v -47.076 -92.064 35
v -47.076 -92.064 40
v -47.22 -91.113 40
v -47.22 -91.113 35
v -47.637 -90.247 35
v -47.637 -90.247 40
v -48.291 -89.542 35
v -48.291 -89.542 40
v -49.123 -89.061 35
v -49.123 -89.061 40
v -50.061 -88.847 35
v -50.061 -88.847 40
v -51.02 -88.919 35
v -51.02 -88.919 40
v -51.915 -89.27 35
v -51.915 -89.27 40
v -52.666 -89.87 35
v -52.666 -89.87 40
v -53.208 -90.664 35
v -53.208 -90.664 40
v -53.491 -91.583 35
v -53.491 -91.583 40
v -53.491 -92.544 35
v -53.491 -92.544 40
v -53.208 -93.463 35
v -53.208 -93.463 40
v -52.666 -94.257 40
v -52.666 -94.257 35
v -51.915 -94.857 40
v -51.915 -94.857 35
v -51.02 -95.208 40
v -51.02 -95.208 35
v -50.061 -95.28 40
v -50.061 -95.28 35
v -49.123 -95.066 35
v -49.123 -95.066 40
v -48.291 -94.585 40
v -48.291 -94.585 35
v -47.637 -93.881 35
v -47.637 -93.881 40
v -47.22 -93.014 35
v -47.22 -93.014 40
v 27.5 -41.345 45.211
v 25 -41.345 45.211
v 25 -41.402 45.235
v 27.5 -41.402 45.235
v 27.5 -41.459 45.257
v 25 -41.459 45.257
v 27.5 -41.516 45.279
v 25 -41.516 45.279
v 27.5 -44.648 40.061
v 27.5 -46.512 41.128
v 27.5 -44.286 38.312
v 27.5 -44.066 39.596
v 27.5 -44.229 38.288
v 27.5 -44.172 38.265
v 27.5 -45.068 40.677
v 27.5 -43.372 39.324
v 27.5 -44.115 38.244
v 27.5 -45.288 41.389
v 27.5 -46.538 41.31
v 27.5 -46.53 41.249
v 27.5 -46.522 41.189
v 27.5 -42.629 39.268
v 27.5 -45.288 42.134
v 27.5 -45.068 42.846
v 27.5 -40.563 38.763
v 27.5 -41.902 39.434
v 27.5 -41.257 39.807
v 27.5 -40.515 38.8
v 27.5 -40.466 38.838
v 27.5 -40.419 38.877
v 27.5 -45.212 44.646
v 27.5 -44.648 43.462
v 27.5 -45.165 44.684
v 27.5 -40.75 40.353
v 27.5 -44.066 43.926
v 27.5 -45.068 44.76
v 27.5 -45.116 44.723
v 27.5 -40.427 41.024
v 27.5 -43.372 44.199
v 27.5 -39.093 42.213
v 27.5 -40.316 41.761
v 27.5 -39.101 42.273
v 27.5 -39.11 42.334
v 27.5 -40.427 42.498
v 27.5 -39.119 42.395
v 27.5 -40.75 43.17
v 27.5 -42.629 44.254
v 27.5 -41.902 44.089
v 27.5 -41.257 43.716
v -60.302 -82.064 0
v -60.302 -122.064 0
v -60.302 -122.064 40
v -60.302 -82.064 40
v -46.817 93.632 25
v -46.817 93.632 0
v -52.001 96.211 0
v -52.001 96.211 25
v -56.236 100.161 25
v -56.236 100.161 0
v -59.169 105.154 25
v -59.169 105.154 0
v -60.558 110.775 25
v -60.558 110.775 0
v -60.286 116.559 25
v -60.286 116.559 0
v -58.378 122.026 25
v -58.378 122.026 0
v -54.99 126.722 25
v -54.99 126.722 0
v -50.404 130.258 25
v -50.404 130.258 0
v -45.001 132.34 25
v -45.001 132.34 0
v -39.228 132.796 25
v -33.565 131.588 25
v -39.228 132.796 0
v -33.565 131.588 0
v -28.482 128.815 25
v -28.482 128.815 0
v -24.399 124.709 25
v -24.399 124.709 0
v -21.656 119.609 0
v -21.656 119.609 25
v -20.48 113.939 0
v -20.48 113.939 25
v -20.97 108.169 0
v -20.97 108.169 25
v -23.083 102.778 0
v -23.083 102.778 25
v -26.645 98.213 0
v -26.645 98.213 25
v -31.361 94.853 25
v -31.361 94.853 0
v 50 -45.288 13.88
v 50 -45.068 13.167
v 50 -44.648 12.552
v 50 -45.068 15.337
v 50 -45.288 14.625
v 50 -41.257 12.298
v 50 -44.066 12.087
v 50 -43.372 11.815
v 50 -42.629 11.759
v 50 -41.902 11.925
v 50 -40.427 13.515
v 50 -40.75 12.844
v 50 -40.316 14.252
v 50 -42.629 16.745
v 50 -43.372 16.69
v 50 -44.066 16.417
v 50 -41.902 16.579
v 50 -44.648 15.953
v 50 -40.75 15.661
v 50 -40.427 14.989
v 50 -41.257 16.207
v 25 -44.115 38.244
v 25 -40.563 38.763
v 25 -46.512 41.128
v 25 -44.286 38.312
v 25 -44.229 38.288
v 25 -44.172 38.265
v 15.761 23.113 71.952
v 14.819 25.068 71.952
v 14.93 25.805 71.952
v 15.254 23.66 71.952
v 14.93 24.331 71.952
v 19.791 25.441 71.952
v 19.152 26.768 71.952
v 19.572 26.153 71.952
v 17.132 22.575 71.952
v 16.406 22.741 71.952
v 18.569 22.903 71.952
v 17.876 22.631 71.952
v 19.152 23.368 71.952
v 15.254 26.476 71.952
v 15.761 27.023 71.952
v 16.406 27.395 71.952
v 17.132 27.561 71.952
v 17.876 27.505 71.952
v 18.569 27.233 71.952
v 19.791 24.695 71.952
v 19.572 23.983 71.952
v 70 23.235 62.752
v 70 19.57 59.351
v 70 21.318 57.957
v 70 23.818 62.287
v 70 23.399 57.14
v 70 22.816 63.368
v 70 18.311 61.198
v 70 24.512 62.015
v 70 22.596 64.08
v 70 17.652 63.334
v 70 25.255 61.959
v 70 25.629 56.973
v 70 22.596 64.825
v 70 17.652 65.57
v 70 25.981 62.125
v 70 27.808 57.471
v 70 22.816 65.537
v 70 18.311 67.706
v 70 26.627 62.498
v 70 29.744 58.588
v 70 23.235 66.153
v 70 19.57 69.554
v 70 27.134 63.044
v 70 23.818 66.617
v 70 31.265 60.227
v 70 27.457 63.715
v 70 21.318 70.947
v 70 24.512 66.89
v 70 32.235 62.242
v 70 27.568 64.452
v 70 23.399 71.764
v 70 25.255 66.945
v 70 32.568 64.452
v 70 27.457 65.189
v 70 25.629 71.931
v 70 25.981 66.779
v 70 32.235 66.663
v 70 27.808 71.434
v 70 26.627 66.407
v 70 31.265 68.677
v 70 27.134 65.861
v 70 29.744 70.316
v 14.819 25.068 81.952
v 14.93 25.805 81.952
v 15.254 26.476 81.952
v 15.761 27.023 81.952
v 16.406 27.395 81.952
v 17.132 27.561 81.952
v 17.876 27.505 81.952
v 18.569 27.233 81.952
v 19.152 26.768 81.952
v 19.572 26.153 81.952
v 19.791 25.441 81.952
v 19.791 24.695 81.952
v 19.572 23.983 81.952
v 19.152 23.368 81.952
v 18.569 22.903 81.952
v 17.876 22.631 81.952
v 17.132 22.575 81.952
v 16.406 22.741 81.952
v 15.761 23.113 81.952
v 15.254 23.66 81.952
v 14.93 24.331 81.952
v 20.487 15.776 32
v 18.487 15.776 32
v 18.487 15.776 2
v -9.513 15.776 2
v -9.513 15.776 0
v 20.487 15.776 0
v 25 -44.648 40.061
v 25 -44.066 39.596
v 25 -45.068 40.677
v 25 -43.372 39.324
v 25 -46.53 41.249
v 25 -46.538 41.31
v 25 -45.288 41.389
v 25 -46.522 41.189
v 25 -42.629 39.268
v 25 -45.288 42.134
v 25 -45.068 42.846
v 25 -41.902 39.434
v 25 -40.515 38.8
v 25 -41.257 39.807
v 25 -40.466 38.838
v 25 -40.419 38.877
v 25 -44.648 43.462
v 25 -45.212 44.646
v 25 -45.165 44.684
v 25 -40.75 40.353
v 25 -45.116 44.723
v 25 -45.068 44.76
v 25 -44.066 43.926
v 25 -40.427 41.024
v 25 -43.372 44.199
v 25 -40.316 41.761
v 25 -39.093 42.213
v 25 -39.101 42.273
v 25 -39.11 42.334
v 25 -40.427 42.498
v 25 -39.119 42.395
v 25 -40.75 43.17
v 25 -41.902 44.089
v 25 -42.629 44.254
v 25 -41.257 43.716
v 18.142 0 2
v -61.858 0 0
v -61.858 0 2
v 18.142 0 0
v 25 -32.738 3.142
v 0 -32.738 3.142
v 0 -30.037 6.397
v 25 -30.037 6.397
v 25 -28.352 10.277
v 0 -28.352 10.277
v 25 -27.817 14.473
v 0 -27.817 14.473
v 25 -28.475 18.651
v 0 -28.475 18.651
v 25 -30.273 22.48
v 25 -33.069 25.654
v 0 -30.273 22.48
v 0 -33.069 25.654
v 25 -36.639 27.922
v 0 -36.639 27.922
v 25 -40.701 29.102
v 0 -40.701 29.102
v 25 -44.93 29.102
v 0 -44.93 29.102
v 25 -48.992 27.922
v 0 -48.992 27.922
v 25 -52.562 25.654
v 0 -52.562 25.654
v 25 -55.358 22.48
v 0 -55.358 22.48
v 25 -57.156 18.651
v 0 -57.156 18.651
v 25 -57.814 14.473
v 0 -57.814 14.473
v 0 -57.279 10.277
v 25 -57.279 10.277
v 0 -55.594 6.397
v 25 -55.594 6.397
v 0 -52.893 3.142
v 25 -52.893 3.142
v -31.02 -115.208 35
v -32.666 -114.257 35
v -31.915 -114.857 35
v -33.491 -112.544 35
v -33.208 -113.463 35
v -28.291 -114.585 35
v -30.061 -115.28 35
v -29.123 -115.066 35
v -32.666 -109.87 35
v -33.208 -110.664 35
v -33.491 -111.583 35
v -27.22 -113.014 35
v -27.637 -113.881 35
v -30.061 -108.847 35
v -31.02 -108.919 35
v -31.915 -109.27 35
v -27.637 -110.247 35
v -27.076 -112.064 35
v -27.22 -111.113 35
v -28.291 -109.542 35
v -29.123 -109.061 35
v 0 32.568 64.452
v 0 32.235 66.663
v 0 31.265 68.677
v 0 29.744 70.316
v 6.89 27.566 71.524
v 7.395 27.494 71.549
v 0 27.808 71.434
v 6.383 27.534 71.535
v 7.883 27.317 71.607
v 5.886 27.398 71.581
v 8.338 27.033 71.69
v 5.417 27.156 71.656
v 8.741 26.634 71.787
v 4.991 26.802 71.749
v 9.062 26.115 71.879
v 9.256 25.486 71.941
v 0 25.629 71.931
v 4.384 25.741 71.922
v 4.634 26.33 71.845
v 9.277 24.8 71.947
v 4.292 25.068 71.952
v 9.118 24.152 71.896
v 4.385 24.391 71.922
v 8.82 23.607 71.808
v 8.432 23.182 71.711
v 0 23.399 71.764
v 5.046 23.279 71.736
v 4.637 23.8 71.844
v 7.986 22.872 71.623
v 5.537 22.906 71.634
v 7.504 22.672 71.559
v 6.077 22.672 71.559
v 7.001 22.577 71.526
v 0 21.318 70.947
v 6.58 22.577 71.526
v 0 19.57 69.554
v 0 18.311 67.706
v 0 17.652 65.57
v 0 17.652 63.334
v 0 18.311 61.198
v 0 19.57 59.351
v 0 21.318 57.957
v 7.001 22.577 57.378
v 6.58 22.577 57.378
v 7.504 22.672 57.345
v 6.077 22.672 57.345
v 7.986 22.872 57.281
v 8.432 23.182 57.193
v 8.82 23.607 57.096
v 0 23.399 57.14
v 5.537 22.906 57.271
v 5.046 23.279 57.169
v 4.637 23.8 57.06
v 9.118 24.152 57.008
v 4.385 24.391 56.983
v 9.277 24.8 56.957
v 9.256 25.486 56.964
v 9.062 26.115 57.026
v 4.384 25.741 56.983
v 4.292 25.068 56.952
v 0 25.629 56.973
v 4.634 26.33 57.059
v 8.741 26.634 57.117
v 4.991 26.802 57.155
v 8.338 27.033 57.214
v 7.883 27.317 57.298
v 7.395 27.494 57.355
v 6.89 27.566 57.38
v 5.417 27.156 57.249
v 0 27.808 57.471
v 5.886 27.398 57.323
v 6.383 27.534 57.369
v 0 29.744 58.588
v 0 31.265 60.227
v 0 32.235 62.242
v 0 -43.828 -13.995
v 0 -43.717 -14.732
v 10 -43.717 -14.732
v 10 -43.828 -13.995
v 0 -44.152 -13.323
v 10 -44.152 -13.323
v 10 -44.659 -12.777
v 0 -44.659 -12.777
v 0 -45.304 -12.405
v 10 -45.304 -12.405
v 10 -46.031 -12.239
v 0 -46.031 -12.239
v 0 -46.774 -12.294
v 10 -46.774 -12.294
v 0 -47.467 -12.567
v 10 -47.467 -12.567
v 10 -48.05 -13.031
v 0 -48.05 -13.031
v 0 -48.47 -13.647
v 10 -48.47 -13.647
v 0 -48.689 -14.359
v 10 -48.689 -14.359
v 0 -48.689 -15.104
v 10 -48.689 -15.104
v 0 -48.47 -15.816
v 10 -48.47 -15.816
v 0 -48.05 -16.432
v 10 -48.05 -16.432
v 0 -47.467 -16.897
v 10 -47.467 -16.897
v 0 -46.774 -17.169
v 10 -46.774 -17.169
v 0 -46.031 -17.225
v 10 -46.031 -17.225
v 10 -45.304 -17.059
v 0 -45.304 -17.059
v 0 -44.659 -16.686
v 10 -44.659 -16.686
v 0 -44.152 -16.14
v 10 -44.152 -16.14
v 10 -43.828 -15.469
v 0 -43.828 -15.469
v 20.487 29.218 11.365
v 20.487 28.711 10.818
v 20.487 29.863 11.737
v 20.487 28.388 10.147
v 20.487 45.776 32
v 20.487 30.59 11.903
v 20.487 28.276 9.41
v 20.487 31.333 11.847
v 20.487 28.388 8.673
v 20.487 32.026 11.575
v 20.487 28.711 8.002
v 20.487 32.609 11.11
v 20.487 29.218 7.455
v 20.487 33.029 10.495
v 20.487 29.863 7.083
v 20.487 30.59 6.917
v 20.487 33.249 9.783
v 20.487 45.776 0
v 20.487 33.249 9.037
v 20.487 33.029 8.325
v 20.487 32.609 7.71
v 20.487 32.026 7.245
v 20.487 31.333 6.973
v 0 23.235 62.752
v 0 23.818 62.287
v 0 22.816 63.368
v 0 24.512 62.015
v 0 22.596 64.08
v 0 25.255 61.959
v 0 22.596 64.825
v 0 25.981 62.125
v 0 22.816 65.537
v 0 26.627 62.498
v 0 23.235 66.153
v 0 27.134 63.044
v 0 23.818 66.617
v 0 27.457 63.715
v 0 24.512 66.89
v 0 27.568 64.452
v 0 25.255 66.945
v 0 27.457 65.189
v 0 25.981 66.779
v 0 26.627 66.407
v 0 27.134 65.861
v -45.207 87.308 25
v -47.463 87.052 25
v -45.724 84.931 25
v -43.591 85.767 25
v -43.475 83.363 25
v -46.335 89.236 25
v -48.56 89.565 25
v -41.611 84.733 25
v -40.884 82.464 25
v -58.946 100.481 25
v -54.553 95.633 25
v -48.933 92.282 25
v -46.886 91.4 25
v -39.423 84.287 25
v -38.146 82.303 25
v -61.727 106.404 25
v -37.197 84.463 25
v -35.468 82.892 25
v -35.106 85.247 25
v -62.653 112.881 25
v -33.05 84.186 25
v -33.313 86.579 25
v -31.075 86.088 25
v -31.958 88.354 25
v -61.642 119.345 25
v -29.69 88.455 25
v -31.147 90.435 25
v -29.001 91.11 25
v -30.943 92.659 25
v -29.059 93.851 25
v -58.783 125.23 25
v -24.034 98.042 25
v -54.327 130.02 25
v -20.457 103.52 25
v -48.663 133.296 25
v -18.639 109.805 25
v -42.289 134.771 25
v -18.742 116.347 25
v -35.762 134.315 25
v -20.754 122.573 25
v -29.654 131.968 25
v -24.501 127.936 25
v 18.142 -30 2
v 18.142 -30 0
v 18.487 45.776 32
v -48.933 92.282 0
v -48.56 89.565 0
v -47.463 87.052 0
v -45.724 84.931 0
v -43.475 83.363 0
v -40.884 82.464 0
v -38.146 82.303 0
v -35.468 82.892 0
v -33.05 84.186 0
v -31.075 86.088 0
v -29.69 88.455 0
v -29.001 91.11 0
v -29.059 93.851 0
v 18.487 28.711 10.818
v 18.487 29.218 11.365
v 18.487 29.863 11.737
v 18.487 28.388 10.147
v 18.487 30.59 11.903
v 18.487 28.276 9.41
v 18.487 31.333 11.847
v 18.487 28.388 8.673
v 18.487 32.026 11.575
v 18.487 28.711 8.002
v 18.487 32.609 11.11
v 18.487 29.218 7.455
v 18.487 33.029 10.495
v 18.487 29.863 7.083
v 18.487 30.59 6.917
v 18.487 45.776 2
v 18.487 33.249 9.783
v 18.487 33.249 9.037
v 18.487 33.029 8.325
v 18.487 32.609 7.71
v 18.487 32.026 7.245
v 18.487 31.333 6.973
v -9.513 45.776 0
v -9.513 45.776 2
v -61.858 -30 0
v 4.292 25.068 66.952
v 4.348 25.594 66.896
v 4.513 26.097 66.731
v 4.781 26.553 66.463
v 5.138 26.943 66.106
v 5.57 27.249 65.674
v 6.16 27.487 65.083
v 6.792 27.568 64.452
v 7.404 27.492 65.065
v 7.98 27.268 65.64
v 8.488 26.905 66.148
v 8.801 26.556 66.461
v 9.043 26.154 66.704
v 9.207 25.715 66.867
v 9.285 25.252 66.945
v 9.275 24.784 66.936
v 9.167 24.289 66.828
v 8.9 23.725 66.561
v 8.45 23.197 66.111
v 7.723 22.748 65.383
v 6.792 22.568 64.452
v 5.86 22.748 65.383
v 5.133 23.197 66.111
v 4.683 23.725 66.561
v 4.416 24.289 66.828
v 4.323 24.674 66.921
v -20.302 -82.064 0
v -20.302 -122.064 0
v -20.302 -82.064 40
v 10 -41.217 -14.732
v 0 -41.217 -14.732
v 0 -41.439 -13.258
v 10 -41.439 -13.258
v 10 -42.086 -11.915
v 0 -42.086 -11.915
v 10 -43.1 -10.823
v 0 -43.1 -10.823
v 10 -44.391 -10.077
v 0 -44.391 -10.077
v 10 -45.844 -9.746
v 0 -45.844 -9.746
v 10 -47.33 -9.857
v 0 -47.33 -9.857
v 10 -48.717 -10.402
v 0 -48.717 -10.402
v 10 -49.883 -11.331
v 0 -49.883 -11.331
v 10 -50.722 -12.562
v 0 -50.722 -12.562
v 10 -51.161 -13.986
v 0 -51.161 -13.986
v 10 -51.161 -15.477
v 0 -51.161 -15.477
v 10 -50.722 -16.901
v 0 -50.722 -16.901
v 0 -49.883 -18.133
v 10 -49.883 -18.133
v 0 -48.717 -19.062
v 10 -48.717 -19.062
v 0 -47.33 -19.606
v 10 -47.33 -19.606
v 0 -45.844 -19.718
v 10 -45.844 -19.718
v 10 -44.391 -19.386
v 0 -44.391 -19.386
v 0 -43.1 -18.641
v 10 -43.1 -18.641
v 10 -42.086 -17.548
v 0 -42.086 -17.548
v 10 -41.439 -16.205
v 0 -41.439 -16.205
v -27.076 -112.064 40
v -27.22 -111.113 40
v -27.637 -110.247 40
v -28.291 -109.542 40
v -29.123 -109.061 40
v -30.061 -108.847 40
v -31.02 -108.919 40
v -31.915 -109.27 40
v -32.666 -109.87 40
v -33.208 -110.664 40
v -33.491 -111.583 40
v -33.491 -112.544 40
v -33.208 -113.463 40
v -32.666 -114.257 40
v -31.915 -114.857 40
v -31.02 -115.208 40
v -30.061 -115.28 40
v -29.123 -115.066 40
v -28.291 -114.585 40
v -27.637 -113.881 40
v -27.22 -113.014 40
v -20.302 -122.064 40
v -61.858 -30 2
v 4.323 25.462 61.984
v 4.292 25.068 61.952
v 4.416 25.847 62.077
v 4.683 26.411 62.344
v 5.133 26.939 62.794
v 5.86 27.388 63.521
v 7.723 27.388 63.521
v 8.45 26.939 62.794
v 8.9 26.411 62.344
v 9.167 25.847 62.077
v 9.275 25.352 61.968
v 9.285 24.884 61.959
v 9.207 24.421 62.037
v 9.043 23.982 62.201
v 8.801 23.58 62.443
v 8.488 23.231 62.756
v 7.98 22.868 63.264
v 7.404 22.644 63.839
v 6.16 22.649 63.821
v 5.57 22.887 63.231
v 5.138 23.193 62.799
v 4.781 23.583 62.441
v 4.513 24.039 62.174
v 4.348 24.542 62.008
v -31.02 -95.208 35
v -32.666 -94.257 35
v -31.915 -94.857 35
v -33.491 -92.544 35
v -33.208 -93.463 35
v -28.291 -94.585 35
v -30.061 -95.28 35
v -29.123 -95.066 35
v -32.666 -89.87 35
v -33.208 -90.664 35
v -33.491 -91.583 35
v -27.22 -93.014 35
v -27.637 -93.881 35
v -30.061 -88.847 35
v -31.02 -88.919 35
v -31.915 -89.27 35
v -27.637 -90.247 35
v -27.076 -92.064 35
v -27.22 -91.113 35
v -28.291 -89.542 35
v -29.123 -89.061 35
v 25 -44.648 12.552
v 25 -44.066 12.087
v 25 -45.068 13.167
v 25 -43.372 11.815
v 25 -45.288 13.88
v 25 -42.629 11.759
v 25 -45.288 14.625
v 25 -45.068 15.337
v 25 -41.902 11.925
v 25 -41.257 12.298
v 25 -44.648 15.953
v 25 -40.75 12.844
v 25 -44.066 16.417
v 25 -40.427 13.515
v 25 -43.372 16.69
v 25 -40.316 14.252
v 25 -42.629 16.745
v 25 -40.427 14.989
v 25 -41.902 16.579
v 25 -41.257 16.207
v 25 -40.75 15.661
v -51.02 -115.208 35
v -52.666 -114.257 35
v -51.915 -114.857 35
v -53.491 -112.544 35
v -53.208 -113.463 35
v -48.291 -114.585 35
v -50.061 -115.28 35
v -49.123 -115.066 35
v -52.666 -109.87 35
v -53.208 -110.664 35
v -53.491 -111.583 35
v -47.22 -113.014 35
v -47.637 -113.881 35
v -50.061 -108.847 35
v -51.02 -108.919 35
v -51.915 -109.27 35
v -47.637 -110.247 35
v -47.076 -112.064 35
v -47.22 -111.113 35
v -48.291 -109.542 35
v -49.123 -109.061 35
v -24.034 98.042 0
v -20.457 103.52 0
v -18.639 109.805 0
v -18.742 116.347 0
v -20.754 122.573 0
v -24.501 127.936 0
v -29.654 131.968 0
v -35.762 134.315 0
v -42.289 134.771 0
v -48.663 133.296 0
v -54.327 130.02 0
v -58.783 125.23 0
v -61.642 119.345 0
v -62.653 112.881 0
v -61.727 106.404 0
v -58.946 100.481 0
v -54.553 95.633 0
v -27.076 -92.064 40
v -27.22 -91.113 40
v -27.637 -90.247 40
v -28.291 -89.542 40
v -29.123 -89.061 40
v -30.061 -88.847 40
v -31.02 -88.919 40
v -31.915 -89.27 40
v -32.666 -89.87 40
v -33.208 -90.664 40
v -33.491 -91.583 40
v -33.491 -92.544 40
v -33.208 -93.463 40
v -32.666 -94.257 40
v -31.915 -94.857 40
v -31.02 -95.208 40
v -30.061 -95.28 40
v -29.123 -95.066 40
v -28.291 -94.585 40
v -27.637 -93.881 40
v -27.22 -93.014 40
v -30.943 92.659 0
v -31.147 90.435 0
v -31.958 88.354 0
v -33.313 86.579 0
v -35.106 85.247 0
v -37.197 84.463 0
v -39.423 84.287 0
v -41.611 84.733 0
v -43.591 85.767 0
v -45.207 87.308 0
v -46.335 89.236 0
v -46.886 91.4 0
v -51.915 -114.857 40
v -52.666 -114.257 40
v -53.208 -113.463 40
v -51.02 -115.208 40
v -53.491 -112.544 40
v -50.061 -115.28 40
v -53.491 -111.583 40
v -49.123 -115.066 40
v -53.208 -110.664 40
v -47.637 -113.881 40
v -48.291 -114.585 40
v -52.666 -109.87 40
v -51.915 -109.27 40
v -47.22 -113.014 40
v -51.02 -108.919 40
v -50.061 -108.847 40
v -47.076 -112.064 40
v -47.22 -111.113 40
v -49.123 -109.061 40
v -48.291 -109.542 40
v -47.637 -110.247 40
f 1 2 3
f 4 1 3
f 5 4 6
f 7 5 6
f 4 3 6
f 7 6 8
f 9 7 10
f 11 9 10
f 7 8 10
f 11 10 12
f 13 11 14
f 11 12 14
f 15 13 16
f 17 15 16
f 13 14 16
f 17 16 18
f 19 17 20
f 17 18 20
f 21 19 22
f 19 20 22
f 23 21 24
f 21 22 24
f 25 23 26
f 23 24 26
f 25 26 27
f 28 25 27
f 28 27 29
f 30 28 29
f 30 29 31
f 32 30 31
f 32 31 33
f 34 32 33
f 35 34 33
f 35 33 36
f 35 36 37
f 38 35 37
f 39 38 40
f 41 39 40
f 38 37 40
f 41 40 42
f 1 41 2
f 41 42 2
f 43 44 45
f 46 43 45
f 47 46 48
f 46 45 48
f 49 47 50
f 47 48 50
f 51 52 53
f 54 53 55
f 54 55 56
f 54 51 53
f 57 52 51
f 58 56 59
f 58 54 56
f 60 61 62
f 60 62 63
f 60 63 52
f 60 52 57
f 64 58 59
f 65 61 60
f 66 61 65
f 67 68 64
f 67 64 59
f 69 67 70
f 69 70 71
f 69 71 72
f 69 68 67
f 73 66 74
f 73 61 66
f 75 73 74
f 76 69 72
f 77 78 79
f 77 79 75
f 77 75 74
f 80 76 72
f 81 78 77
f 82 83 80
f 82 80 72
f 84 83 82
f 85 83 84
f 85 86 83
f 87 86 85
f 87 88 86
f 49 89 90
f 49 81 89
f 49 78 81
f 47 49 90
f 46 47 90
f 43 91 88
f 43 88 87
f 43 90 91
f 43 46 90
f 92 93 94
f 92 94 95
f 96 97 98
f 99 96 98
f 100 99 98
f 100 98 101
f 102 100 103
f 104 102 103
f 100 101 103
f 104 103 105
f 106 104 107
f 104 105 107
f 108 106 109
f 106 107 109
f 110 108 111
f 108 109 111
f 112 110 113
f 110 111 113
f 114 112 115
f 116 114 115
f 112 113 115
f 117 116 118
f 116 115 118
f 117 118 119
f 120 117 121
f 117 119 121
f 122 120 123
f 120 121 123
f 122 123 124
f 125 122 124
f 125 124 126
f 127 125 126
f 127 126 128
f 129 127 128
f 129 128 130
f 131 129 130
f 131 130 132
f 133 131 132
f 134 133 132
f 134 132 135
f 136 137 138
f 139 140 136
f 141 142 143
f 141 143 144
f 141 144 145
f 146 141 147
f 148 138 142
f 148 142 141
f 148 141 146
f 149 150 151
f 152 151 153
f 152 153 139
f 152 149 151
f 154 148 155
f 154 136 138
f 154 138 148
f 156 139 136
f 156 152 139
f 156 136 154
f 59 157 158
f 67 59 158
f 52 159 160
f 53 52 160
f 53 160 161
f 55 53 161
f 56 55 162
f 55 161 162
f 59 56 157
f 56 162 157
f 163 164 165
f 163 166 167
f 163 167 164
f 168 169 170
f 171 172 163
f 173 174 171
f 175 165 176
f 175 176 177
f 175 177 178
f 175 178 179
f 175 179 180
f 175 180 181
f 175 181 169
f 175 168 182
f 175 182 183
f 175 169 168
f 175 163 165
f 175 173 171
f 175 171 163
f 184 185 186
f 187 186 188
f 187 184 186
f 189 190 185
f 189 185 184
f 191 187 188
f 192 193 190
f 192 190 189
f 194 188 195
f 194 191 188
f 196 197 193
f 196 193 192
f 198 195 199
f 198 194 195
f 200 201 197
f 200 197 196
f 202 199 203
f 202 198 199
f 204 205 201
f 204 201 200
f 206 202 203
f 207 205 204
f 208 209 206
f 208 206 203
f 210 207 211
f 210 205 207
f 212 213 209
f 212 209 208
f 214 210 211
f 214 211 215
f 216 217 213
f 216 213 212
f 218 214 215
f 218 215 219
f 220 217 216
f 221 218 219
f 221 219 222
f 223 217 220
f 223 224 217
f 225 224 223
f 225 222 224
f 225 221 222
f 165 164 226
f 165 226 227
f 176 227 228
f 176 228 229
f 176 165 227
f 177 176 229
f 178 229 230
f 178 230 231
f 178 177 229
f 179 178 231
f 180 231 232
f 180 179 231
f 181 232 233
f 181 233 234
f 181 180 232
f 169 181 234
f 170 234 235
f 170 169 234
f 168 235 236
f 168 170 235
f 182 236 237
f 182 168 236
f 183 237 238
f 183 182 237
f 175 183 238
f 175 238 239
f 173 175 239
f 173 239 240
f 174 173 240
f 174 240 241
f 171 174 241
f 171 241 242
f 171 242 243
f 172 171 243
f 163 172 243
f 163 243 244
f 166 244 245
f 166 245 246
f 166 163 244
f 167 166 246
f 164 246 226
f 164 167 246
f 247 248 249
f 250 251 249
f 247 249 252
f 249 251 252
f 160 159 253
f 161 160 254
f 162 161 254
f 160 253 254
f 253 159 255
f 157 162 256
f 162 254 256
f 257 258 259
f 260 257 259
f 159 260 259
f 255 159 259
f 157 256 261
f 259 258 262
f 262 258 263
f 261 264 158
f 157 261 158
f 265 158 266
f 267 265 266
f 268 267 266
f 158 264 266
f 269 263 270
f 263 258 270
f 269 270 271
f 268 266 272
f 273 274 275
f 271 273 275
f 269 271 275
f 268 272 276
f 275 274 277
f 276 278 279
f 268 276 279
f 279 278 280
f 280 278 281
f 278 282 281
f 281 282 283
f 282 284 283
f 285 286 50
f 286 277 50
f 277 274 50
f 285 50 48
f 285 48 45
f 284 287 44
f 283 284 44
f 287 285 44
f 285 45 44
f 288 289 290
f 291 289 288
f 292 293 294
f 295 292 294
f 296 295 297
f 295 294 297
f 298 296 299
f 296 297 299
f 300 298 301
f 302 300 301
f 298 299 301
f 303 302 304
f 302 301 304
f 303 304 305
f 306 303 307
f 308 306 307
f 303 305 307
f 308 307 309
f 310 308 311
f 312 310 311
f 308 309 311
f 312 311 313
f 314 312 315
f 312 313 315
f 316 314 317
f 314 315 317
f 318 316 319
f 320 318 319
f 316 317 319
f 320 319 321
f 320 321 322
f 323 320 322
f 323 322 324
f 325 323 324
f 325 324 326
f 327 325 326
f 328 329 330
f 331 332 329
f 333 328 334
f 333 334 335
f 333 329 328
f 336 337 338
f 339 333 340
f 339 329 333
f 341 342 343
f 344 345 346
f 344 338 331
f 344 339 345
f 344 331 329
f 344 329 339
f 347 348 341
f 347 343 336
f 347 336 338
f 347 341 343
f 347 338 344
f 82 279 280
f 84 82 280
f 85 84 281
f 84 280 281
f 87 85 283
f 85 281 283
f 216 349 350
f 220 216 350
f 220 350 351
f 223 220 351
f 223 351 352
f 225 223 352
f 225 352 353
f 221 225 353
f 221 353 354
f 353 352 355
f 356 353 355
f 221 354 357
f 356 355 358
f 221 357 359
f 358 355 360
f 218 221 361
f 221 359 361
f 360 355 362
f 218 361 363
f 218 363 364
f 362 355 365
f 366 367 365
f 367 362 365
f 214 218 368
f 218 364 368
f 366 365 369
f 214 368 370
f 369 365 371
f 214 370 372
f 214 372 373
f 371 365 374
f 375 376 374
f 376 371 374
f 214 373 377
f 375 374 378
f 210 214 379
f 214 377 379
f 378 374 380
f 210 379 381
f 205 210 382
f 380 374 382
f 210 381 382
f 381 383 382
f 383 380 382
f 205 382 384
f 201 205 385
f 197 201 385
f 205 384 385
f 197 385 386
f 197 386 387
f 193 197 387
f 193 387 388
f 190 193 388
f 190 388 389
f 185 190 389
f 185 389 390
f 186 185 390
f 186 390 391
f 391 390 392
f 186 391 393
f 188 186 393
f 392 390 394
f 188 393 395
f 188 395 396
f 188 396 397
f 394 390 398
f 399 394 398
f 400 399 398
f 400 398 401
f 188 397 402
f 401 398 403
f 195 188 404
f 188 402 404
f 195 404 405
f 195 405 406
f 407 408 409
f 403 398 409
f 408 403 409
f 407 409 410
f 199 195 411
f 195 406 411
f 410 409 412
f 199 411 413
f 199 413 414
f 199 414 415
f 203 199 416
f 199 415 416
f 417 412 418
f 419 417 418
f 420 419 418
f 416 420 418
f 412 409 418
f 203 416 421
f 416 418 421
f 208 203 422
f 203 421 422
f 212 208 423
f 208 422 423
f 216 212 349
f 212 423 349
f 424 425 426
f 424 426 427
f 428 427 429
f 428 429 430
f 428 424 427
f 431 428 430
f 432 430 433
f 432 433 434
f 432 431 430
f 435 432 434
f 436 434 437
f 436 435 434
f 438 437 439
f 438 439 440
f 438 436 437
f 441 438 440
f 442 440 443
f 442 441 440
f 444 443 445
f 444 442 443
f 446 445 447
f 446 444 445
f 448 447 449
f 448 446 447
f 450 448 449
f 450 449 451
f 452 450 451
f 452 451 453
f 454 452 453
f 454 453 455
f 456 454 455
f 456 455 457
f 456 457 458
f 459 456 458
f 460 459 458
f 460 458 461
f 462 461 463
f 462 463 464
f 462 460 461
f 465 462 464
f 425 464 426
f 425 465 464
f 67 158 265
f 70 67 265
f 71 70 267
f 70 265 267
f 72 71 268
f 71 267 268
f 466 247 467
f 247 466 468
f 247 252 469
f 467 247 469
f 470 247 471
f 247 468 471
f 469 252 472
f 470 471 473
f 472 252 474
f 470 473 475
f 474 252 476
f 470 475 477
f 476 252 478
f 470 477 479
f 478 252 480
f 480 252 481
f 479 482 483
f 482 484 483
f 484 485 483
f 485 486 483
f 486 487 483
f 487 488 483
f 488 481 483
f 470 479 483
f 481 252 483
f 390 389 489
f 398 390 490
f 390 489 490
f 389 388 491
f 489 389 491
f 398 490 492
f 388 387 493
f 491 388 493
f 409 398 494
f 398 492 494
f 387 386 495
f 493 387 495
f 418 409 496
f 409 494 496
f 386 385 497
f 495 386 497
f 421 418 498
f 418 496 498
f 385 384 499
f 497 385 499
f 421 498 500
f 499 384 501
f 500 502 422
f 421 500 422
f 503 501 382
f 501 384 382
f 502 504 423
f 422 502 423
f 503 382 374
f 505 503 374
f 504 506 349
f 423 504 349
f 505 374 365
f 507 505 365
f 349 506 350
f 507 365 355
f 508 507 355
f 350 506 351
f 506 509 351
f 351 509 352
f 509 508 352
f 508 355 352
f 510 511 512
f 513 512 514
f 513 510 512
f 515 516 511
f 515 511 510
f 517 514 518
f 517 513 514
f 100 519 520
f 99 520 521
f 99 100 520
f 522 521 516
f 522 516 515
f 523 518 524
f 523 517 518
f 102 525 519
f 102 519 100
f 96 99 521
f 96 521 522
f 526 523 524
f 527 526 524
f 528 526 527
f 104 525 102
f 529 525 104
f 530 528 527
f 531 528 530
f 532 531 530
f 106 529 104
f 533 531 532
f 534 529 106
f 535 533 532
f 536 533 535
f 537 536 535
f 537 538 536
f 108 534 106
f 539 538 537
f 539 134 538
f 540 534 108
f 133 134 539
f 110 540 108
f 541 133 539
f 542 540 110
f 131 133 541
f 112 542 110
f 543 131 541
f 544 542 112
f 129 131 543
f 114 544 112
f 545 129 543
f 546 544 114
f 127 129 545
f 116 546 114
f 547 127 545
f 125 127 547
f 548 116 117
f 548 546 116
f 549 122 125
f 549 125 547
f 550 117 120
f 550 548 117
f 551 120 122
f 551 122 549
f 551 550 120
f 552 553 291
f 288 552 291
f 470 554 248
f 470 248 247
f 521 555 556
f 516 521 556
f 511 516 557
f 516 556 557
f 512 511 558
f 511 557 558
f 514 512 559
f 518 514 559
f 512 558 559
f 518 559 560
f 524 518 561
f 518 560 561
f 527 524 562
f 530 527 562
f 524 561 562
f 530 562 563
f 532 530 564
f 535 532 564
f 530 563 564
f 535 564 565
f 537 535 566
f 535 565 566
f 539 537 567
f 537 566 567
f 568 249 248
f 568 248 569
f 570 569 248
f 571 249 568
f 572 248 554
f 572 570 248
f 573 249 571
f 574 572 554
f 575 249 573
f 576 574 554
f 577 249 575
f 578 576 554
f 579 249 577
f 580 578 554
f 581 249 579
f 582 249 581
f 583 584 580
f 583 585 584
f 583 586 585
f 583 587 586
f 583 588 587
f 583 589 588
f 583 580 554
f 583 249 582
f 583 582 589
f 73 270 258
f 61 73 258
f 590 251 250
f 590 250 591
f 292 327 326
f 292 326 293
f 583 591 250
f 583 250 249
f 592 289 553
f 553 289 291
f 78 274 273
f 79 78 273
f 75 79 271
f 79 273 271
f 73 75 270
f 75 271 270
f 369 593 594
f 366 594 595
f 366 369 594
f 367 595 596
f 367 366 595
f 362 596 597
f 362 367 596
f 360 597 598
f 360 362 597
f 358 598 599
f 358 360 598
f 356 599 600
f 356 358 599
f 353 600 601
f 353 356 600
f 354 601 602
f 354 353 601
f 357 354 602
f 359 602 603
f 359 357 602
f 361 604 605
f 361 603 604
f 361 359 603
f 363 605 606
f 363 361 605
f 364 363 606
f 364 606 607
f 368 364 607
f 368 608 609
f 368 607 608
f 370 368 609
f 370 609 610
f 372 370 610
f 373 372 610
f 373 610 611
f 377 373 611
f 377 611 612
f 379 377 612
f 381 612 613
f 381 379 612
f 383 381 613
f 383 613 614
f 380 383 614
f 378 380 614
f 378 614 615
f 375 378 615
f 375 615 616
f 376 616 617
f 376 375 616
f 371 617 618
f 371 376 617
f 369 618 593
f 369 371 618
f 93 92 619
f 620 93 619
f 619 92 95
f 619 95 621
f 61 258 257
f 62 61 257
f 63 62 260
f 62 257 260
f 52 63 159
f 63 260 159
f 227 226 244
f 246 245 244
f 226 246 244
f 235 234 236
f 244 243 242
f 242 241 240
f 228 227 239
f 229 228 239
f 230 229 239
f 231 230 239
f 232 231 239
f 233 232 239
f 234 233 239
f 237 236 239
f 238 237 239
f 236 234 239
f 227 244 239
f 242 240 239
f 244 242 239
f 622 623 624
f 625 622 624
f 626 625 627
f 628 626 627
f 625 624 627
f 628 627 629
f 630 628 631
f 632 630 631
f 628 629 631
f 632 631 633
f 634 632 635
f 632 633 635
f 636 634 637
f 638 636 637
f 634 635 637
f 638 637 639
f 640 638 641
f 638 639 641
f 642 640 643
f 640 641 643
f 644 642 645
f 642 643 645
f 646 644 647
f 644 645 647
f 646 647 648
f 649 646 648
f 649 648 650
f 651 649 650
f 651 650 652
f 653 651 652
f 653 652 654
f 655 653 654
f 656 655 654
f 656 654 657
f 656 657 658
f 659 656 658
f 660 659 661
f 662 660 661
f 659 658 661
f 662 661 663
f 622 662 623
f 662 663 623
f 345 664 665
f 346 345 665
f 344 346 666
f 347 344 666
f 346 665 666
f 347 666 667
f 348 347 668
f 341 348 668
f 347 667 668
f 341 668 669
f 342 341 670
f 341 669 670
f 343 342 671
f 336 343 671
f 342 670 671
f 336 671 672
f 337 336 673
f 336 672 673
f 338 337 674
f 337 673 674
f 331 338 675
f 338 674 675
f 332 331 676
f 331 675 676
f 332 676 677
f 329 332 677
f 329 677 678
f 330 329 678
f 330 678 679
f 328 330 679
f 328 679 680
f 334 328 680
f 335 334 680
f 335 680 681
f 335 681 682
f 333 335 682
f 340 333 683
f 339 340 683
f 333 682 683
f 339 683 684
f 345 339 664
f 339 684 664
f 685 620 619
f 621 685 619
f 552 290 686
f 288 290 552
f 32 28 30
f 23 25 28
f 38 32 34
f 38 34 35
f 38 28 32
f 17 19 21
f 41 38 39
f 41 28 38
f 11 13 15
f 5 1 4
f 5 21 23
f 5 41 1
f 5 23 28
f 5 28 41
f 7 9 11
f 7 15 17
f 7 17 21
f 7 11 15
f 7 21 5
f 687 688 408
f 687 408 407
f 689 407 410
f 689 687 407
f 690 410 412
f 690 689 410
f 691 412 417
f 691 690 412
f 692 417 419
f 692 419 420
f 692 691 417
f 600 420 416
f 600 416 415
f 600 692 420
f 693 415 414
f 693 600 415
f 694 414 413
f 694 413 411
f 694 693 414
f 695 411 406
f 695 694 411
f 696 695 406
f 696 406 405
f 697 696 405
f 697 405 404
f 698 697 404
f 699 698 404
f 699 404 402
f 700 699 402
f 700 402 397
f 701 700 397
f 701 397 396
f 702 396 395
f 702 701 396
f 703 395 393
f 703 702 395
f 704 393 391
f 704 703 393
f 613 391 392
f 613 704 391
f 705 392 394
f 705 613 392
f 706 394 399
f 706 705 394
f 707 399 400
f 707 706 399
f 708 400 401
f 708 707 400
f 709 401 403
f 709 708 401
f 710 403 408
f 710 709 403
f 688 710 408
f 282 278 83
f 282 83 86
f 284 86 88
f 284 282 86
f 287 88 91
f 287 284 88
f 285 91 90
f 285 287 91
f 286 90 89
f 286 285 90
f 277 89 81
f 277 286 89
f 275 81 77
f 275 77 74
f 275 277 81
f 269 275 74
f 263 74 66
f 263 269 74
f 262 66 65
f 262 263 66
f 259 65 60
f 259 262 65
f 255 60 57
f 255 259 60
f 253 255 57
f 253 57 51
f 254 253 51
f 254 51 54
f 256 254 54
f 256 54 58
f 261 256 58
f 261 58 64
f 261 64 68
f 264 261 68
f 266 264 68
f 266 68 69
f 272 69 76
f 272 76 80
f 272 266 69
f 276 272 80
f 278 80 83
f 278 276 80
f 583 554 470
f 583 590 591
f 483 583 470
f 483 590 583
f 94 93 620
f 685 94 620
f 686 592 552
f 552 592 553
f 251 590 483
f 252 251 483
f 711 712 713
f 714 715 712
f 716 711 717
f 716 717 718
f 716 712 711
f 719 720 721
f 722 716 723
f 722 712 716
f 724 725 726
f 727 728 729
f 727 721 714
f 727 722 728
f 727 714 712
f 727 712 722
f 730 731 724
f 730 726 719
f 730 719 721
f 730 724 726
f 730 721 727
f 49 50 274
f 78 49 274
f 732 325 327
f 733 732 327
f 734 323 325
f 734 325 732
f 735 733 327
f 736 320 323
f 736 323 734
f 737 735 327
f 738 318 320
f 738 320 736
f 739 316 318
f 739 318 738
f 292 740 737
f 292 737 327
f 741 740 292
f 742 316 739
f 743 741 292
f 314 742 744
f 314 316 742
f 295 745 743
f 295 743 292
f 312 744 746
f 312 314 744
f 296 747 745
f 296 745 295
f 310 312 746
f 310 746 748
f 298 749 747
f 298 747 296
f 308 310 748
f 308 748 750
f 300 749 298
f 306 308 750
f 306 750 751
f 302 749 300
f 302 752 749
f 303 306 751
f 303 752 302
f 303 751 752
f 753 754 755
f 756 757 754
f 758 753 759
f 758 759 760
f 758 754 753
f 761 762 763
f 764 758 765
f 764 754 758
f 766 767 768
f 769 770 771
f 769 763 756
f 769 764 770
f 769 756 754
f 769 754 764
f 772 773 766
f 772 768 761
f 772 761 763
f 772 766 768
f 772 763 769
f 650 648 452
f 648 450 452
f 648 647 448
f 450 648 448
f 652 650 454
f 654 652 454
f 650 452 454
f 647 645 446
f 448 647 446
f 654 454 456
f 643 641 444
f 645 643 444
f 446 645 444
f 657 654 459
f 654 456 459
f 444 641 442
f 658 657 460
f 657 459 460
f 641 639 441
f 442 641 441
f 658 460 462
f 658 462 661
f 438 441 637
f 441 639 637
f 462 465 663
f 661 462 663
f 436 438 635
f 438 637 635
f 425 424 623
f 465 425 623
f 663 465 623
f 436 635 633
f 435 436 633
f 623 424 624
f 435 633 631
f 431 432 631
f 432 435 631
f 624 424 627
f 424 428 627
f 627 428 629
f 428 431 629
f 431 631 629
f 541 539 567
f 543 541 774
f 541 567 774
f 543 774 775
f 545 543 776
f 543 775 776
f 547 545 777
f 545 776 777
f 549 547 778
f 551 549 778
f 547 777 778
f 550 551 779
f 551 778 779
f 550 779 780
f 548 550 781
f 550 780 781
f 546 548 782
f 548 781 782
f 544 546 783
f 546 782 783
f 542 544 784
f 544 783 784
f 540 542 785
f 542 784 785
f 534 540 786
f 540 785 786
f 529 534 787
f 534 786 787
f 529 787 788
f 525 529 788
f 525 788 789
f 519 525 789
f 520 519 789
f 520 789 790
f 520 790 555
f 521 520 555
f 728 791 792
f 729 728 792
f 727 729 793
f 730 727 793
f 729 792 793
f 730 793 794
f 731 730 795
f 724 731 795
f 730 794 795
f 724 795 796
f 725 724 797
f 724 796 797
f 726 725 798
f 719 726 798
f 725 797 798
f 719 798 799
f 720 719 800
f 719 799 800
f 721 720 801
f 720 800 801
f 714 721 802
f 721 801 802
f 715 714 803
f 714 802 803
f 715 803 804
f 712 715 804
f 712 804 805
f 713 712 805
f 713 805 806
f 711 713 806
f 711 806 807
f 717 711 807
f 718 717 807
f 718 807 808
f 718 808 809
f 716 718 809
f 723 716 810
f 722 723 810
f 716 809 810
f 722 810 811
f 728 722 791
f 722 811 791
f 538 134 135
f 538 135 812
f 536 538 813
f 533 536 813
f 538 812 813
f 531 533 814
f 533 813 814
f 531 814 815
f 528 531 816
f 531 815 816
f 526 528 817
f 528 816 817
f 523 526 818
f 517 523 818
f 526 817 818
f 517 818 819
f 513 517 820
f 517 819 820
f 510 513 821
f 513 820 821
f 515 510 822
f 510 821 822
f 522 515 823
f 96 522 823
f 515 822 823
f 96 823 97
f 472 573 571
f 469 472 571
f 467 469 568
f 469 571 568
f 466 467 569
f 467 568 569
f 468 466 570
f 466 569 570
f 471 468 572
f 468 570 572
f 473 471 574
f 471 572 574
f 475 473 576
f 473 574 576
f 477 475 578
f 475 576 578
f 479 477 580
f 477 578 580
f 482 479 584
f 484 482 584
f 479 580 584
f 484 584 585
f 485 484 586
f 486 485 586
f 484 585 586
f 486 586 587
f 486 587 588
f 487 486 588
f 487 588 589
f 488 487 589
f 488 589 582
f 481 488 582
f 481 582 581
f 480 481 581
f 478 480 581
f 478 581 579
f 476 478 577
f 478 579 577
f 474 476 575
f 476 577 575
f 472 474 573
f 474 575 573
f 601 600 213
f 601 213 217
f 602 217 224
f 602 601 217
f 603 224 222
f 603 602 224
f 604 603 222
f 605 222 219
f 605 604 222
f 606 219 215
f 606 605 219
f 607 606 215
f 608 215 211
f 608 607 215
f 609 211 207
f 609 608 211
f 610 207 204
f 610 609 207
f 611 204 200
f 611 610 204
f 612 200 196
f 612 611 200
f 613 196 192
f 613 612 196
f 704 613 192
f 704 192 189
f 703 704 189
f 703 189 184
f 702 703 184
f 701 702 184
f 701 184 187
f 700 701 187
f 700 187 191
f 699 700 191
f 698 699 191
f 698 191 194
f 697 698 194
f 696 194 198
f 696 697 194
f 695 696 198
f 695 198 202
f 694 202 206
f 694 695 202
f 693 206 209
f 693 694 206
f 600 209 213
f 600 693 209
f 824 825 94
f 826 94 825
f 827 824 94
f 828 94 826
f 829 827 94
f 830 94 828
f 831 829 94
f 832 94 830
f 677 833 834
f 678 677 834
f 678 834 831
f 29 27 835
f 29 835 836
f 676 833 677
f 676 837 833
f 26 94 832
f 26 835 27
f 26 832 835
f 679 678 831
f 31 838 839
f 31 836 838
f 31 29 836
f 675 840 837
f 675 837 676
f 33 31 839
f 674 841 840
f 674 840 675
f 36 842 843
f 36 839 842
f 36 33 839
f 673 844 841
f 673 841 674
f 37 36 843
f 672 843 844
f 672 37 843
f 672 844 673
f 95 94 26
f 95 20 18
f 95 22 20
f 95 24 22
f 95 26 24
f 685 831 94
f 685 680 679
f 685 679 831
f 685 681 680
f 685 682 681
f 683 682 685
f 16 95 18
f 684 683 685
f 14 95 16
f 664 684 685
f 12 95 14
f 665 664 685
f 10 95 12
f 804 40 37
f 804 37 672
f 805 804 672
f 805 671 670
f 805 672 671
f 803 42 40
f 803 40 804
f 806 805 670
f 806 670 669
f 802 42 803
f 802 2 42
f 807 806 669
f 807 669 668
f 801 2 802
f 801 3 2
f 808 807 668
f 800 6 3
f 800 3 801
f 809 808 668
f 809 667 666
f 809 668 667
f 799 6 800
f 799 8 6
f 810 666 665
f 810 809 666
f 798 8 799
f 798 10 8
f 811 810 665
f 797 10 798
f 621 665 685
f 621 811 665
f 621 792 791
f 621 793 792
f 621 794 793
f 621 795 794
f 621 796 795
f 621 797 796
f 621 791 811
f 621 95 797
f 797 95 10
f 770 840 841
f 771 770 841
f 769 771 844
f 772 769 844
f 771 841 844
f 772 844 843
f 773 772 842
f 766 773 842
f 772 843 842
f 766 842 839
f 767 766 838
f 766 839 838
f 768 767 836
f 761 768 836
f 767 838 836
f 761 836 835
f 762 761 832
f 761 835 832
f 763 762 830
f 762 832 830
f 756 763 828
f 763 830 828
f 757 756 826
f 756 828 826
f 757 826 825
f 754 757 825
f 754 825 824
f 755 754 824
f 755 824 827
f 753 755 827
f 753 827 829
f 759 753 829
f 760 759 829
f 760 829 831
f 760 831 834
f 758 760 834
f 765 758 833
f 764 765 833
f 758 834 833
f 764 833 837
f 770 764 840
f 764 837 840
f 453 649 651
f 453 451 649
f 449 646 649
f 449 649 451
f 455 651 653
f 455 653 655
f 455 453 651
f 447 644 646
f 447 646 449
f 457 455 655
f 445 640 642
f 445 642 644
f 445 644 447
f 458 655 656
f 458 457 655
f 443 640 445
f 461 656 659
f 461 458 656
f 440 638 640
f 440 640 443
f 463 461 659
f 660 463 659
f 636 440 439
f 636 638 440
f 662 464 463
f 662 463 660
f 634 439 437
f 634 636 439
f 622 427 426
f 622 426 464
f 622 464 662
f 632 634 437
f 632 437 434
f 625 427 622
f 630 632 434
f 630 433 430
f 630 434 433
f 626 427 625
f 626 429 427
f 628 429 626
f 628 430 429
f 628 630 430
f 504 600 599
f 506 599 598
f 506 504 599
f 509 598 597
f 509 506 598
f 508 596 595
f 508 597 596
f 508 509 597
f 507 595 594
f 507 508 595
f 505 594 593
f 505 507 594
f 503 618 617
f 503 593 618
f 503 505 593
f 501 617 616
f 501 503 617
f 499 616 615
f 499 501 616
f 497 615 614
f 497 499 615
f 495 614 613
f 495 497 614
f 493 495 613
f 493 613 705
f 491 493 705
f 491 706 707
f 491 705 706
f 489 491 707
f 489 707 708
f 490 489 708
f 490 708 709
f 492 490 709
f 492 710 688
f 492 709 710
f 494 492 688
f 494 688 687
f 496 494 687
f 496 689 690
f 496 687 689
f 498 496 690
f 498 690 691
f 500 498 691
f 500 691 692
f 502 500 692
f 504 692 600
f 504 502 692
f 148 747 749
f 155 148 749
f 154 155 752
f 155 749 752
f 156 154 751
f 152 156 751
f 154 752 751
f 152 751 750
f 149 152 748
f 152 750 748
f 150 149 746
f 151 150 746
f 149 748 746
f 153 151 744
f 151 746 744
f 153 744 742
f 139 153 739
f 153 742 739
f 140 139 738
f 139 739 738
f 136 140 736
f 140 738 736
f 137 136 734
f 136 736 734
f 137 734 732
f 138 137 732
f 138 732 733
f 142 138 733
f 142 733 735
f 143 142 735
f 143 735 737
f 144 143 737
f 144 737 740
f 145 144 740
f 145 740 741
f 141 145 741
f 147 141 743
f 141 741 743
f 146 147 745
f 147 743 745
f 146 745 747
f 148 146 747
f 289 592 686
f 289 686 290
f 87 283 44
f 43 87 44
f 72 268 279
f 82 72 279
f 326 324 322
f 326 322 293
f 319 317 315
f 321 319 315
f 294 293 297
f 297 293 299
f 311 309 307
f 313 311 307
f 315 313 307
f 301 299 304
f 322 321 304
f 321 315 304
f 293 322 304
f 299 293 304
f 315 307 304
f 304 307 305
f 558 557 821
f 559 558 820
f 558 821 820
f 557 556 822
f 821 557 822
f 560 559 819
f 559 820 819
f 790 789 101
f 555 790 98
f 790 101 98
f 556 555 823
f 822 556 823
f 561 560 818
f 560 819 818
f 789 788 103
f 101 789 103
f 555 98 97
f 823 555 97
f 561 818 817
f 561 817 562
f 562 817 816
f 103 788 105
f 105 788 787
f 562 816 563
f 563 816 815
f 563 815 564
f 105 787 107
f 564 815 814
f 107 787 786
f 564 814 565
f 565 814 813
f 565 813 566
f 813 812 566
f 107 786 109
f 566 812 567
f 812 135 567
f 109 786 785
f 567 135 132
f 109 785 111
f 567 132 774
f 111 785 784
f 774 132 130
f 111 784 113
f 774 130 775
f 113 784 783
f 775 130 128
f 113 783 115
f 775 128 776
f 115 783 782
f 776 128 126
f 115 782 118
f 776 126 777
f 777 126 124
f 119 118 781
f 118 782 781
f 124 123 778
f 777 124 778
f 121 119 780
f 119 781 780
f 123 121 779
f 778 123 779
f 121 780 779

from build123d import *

# Parameters (mm, degrees)
F0_W      = 30
F0_H      = 30
F1_DEPTH  = 2
F2_W      = 2
F2_H      = 30
F3_DEPTH  = 30
F5_DEPTH  = 25
F6_R      = 2.5
F7_DEPTH  = 25
F8_R      = 2.5
F9_DEPTH  = 2
F0_W_2    = 80
F10_DEPTH = 2
F12_DEPTH = 2.5
F4_R      = 5
F4_R_2    = 2.5
F13_DEPTH = 10
F14_DEPTH = 25
F0_W_3    = 40
F0_H_2    = 40
F15_DEPTH = 40
F16_R     = 3.2254140047
F17_DEPTH = 5
F18_R     = 2.5
F19_DEPTH = 70
F22_DEPTH = 91.6849308292
F23_DEPTH = 10


# Not quite as in the source:
# - a feature names something its author has since deleted; it is built from what else it names


with BuildPart() as f1:
    # F0 (on Top) → F1 (new body)
    with BuildSketch(Plane.XY):
        with Locations((5.4872950528, 30.7764774188)):
            Rectangle(F0_W, F0_H)
    extrude(amount=F1_DEPTH)

    # F2 (on face) → F3 (join)
    with BuildSketch(Plane.XY.offset(2)):
        with Locations((19.4872950528, 30.7764774188)):
            Rectangle(F2_W, F2_H)
    extrude(amount=F3_DEPTH)

    # F8 (on face) → F9 (cut, through all)
    with BuildSketch(Plane(origin=(18.4872950528, 0, 0), x_dir=(0, -1, 0), z_dir=(-1, 0, 0))):
        with Locations((-30.7764774188, 9.41)):
            Circle(F8_R)
    extrude(amount=-F9_DEPTH, mode=Mode.SUBTRACT)


with BuildPart() as f5:
    # F4 (on Right) → F5 (new body)
    with BuildSketch(Plane.YZ):
        with BuildLine():
            Line((-52.8934156308, 3.1420226926), (-32.7376361042, 3.1420226926))
            ThreePointArc((-32.7376361042, 3.1420226926), (-42.8155258675, 29.2522044156), (-52.8934156308, 3.1420226926))
        make_face()
    extrude(amount=F5_DEPTH)

    # F6 (on face) → F7 (join)
    with BuildSketch(Plane.YZ.offset(25)):
        with Locations((-42.8155258675, 14.2522044156)):
            Circle(F6_R)
    extrude(amount=F7_DEPTH)


with BuildPart() as f10:
    # F0 (on Top) → F10 (new body)
    with BuildSketch(Plane.XY):
        with Locations((-21.8575587869, -15)):
            Rectangle(F0_W_2, F0_H)
    extrude(amount=F10_DEPTH)


with BuildPart() as f12:
    # F6 (on face) → F12 (new body)
    with BuildSketch(Plane.YZ.offset(25)):
        with BuildLine():
            Line((-39.1193990775, 42.3947411596), (-41.3449491195, 45.2110034407))
            ThreePointArc((-41.3449491195, 45.2110034407), (-41.4300421528, 45.2460511048), (-41.5159695959, 45.27900012))
            Line((-41.5159695959, 45.27900012), (-45.0676992959, 44.7597483868))
            ThreePointArc((-45.0676992959, 44.7597483868), (-45.1405979801, 44.7035794904), (-45.2120963858, 44.6456386494))
            Line((-45.2120963858, 44.6456386494), (-46.538276044, 41.3101246351))
            ThreePointArc((-46.538276044, 41.3101246351), (-46.5260816948, 41.2189080745), (-46.5116526575, 41.1280182183))
            Line((-46.5116526575, 41.1280182183), (-44.2861026155, 38.3117559373))
            ThreePointArc((-44.2861026155, 38.3117559373), (-44.2010095822, 38.2767082732), (-44.1150821391, 38.2437592579))
            Line((-44.1150821391, 38.2437592579), (-40.563352439, 38.7630109911))
            ThreePointArc((-40.563352439, 38.7630109911), (-40.4904537549, 38.8191798876), (-40.4189553491, 38.8771207286))
            Line((-40.4189553491, 38.8771207286), (-39.092775691, 42.2126347428))
            ThreePointArc((-39.092775691, 42.2126347428), (-39.1049700402, 42.3038513034), (-39.1193990775, 42.3947411596))
        make_face()
        with Locations((-42.8155258675, 41.761379689)):
            Circle(F6_R, mode=Mode.SUBTRACT)
    extrude(amount=F12_DEPTH)


with BuildPart() as f13:
    # F4 (on Right) → F13 (new body)
    with BuildSketch(Plane.YZ):
        with Locations((-46.217340976, -14.7316996008)):
            Circle(F4_R)
        with Locations((-46.217340976, -14.7316996008)):
            Circle(F4_R_2, mode=Mode.SUBTRACT)
    extrude(amount=F13_DEPTH)


with BuildPart() as f14:
    # F0 (on Top) → F14 (new body)
    with BuildSketch(Plane.XY):
        with BuildLine():
            ThreePointArc((-29.0589361801, 93.8513494414), (-42.2885690725, 134.7708941054), (-48.9334039126, 92.2823251494))
            ThreePointArc((-48.9334039126, 92.2823251494), (-38.1463908298, 82.3028805443), (-29.0589361801, 93.8513494414))
        make_face()
        with BuildLine():
            ThreePointArc((-46.8168556195, 93.6324783746), (-42.1311653612, 132.7770977087), (-31.361124685, 94.8526578336))
            ThreePointArc((-31.361124685, 94.8526578336), (-38.303794541, 84.2966769411), (-46.8168556195, 93.6324783746))
        make_face(mode=Mode.SUBTRACT)
    extrude(amount=F14_DEPTH)


with BuildPart() as f15:
    # F0 (on Top) → F15 (new body)
    with BuildSketch(Plane.XY):
        with Locations((-40.3018663824, -102.0636367798)):
            Rectangle(F0_W_3, F0_H_2)
    extrude(amount=F15_DEPTH)

    # F16 (on face) → F17 (cut)
    with BuildSketch(Plane.XY.offset(40)):
        with Locations((-50.3018663824, -112.0636367798)):
            Circle(F16_R)
        with Locations((-30.3018663824, -112.0636367798)):
            Circle(F16_R)
        with Locations((-30.3018663824, -92.0636367798)):
            Circle(F16_R)
        with Locations((-50.3018663824, -92.0636367798)):
            Circle(F16_R)
    extrude(amount=-F17_DEPTH, mode=Mode.SUBTRACT)


with BuildPart() as f19:
    # F18 (on Right) → F19 (new body)
    with BuildSketch(Plane.YZ):
        with BuildLine():
            ThreePointArc((25.0680372119, 71.9522312284), (19.764736353, 59.1489303695), (32.5680372119, 64.4522312284))
            ThreePointArc((32.5680372119, 64.4522312284), (30.3713380708, 69.7555320873), (25.0680372119, 71.9522312284))
        make_face()
        with Locations((25.0680372119, 64.4522312284)):
            Circle(F18_R, mode=Mode.SUBTRACT)
    extrude(amount=F19_DEPTH)

    # F21 (on face) → F22 (cut, through all)
    with BuildSketch(Plane(origin=(0, 0, 71.9522312284), x_dir=(1, 0, 0), z_dir=(0, 0, -1))):
        with BuildLine():
            Line((4.2916242406, -25.0680372119), (9.2916242406, -25.0680372119))
            ThreePointArc((9.2916242406, -25.0680372119), (6.7916242406, -22.5680372119), (4.2916242406, -25.0680372119))
        make_face()
        with BuildLine():
            ThreePointArc((4.2916242406, -25.0680372119), (6.7916242406, -27.5680372119), (9.2916242406, -25.0680372119))
            Line((9.2916242406, -25.0680372119), (4.2916242406, -25.0680372119))
        make_face()
    extrude(amount=F22_DEPTH, mode=Mode.SUBTRACT)


with BuildPart() as f23:
    # F21 (on face) → F23 (new body)
    with BuildSketch(Plane(origin=(0, 0, 71.9522312284), x_dir=(1, 0, 0), z_dir=(0, 0, -1))):
        with BuildLine():
            ThreePointArc((19.8193216324, -25.0680372119), (17.3193216324, -22.5680372119), (14.8193216324, -25.0680372119))
            Line((14.8193216324, -25.0680372119), (19.8193216324, -25.0680372119))
        make_face()
        with BuildLine():
            Line((19.8193216324, -25.0680372119), (14.8193216324, -25.0680372119))
            ThreePointArc((14.8193216324, -25.0680372119), (17.3193216324, -27.5680372119), (19.8193216324, -25.0680372119))
        make_face()
    extrude(amount=-F23_DEPTH)


solid = Compound([f1.part, f5.part, f10.part, f12.part, f13.part, f14.part, f15.part, f19.part, f23.part])
